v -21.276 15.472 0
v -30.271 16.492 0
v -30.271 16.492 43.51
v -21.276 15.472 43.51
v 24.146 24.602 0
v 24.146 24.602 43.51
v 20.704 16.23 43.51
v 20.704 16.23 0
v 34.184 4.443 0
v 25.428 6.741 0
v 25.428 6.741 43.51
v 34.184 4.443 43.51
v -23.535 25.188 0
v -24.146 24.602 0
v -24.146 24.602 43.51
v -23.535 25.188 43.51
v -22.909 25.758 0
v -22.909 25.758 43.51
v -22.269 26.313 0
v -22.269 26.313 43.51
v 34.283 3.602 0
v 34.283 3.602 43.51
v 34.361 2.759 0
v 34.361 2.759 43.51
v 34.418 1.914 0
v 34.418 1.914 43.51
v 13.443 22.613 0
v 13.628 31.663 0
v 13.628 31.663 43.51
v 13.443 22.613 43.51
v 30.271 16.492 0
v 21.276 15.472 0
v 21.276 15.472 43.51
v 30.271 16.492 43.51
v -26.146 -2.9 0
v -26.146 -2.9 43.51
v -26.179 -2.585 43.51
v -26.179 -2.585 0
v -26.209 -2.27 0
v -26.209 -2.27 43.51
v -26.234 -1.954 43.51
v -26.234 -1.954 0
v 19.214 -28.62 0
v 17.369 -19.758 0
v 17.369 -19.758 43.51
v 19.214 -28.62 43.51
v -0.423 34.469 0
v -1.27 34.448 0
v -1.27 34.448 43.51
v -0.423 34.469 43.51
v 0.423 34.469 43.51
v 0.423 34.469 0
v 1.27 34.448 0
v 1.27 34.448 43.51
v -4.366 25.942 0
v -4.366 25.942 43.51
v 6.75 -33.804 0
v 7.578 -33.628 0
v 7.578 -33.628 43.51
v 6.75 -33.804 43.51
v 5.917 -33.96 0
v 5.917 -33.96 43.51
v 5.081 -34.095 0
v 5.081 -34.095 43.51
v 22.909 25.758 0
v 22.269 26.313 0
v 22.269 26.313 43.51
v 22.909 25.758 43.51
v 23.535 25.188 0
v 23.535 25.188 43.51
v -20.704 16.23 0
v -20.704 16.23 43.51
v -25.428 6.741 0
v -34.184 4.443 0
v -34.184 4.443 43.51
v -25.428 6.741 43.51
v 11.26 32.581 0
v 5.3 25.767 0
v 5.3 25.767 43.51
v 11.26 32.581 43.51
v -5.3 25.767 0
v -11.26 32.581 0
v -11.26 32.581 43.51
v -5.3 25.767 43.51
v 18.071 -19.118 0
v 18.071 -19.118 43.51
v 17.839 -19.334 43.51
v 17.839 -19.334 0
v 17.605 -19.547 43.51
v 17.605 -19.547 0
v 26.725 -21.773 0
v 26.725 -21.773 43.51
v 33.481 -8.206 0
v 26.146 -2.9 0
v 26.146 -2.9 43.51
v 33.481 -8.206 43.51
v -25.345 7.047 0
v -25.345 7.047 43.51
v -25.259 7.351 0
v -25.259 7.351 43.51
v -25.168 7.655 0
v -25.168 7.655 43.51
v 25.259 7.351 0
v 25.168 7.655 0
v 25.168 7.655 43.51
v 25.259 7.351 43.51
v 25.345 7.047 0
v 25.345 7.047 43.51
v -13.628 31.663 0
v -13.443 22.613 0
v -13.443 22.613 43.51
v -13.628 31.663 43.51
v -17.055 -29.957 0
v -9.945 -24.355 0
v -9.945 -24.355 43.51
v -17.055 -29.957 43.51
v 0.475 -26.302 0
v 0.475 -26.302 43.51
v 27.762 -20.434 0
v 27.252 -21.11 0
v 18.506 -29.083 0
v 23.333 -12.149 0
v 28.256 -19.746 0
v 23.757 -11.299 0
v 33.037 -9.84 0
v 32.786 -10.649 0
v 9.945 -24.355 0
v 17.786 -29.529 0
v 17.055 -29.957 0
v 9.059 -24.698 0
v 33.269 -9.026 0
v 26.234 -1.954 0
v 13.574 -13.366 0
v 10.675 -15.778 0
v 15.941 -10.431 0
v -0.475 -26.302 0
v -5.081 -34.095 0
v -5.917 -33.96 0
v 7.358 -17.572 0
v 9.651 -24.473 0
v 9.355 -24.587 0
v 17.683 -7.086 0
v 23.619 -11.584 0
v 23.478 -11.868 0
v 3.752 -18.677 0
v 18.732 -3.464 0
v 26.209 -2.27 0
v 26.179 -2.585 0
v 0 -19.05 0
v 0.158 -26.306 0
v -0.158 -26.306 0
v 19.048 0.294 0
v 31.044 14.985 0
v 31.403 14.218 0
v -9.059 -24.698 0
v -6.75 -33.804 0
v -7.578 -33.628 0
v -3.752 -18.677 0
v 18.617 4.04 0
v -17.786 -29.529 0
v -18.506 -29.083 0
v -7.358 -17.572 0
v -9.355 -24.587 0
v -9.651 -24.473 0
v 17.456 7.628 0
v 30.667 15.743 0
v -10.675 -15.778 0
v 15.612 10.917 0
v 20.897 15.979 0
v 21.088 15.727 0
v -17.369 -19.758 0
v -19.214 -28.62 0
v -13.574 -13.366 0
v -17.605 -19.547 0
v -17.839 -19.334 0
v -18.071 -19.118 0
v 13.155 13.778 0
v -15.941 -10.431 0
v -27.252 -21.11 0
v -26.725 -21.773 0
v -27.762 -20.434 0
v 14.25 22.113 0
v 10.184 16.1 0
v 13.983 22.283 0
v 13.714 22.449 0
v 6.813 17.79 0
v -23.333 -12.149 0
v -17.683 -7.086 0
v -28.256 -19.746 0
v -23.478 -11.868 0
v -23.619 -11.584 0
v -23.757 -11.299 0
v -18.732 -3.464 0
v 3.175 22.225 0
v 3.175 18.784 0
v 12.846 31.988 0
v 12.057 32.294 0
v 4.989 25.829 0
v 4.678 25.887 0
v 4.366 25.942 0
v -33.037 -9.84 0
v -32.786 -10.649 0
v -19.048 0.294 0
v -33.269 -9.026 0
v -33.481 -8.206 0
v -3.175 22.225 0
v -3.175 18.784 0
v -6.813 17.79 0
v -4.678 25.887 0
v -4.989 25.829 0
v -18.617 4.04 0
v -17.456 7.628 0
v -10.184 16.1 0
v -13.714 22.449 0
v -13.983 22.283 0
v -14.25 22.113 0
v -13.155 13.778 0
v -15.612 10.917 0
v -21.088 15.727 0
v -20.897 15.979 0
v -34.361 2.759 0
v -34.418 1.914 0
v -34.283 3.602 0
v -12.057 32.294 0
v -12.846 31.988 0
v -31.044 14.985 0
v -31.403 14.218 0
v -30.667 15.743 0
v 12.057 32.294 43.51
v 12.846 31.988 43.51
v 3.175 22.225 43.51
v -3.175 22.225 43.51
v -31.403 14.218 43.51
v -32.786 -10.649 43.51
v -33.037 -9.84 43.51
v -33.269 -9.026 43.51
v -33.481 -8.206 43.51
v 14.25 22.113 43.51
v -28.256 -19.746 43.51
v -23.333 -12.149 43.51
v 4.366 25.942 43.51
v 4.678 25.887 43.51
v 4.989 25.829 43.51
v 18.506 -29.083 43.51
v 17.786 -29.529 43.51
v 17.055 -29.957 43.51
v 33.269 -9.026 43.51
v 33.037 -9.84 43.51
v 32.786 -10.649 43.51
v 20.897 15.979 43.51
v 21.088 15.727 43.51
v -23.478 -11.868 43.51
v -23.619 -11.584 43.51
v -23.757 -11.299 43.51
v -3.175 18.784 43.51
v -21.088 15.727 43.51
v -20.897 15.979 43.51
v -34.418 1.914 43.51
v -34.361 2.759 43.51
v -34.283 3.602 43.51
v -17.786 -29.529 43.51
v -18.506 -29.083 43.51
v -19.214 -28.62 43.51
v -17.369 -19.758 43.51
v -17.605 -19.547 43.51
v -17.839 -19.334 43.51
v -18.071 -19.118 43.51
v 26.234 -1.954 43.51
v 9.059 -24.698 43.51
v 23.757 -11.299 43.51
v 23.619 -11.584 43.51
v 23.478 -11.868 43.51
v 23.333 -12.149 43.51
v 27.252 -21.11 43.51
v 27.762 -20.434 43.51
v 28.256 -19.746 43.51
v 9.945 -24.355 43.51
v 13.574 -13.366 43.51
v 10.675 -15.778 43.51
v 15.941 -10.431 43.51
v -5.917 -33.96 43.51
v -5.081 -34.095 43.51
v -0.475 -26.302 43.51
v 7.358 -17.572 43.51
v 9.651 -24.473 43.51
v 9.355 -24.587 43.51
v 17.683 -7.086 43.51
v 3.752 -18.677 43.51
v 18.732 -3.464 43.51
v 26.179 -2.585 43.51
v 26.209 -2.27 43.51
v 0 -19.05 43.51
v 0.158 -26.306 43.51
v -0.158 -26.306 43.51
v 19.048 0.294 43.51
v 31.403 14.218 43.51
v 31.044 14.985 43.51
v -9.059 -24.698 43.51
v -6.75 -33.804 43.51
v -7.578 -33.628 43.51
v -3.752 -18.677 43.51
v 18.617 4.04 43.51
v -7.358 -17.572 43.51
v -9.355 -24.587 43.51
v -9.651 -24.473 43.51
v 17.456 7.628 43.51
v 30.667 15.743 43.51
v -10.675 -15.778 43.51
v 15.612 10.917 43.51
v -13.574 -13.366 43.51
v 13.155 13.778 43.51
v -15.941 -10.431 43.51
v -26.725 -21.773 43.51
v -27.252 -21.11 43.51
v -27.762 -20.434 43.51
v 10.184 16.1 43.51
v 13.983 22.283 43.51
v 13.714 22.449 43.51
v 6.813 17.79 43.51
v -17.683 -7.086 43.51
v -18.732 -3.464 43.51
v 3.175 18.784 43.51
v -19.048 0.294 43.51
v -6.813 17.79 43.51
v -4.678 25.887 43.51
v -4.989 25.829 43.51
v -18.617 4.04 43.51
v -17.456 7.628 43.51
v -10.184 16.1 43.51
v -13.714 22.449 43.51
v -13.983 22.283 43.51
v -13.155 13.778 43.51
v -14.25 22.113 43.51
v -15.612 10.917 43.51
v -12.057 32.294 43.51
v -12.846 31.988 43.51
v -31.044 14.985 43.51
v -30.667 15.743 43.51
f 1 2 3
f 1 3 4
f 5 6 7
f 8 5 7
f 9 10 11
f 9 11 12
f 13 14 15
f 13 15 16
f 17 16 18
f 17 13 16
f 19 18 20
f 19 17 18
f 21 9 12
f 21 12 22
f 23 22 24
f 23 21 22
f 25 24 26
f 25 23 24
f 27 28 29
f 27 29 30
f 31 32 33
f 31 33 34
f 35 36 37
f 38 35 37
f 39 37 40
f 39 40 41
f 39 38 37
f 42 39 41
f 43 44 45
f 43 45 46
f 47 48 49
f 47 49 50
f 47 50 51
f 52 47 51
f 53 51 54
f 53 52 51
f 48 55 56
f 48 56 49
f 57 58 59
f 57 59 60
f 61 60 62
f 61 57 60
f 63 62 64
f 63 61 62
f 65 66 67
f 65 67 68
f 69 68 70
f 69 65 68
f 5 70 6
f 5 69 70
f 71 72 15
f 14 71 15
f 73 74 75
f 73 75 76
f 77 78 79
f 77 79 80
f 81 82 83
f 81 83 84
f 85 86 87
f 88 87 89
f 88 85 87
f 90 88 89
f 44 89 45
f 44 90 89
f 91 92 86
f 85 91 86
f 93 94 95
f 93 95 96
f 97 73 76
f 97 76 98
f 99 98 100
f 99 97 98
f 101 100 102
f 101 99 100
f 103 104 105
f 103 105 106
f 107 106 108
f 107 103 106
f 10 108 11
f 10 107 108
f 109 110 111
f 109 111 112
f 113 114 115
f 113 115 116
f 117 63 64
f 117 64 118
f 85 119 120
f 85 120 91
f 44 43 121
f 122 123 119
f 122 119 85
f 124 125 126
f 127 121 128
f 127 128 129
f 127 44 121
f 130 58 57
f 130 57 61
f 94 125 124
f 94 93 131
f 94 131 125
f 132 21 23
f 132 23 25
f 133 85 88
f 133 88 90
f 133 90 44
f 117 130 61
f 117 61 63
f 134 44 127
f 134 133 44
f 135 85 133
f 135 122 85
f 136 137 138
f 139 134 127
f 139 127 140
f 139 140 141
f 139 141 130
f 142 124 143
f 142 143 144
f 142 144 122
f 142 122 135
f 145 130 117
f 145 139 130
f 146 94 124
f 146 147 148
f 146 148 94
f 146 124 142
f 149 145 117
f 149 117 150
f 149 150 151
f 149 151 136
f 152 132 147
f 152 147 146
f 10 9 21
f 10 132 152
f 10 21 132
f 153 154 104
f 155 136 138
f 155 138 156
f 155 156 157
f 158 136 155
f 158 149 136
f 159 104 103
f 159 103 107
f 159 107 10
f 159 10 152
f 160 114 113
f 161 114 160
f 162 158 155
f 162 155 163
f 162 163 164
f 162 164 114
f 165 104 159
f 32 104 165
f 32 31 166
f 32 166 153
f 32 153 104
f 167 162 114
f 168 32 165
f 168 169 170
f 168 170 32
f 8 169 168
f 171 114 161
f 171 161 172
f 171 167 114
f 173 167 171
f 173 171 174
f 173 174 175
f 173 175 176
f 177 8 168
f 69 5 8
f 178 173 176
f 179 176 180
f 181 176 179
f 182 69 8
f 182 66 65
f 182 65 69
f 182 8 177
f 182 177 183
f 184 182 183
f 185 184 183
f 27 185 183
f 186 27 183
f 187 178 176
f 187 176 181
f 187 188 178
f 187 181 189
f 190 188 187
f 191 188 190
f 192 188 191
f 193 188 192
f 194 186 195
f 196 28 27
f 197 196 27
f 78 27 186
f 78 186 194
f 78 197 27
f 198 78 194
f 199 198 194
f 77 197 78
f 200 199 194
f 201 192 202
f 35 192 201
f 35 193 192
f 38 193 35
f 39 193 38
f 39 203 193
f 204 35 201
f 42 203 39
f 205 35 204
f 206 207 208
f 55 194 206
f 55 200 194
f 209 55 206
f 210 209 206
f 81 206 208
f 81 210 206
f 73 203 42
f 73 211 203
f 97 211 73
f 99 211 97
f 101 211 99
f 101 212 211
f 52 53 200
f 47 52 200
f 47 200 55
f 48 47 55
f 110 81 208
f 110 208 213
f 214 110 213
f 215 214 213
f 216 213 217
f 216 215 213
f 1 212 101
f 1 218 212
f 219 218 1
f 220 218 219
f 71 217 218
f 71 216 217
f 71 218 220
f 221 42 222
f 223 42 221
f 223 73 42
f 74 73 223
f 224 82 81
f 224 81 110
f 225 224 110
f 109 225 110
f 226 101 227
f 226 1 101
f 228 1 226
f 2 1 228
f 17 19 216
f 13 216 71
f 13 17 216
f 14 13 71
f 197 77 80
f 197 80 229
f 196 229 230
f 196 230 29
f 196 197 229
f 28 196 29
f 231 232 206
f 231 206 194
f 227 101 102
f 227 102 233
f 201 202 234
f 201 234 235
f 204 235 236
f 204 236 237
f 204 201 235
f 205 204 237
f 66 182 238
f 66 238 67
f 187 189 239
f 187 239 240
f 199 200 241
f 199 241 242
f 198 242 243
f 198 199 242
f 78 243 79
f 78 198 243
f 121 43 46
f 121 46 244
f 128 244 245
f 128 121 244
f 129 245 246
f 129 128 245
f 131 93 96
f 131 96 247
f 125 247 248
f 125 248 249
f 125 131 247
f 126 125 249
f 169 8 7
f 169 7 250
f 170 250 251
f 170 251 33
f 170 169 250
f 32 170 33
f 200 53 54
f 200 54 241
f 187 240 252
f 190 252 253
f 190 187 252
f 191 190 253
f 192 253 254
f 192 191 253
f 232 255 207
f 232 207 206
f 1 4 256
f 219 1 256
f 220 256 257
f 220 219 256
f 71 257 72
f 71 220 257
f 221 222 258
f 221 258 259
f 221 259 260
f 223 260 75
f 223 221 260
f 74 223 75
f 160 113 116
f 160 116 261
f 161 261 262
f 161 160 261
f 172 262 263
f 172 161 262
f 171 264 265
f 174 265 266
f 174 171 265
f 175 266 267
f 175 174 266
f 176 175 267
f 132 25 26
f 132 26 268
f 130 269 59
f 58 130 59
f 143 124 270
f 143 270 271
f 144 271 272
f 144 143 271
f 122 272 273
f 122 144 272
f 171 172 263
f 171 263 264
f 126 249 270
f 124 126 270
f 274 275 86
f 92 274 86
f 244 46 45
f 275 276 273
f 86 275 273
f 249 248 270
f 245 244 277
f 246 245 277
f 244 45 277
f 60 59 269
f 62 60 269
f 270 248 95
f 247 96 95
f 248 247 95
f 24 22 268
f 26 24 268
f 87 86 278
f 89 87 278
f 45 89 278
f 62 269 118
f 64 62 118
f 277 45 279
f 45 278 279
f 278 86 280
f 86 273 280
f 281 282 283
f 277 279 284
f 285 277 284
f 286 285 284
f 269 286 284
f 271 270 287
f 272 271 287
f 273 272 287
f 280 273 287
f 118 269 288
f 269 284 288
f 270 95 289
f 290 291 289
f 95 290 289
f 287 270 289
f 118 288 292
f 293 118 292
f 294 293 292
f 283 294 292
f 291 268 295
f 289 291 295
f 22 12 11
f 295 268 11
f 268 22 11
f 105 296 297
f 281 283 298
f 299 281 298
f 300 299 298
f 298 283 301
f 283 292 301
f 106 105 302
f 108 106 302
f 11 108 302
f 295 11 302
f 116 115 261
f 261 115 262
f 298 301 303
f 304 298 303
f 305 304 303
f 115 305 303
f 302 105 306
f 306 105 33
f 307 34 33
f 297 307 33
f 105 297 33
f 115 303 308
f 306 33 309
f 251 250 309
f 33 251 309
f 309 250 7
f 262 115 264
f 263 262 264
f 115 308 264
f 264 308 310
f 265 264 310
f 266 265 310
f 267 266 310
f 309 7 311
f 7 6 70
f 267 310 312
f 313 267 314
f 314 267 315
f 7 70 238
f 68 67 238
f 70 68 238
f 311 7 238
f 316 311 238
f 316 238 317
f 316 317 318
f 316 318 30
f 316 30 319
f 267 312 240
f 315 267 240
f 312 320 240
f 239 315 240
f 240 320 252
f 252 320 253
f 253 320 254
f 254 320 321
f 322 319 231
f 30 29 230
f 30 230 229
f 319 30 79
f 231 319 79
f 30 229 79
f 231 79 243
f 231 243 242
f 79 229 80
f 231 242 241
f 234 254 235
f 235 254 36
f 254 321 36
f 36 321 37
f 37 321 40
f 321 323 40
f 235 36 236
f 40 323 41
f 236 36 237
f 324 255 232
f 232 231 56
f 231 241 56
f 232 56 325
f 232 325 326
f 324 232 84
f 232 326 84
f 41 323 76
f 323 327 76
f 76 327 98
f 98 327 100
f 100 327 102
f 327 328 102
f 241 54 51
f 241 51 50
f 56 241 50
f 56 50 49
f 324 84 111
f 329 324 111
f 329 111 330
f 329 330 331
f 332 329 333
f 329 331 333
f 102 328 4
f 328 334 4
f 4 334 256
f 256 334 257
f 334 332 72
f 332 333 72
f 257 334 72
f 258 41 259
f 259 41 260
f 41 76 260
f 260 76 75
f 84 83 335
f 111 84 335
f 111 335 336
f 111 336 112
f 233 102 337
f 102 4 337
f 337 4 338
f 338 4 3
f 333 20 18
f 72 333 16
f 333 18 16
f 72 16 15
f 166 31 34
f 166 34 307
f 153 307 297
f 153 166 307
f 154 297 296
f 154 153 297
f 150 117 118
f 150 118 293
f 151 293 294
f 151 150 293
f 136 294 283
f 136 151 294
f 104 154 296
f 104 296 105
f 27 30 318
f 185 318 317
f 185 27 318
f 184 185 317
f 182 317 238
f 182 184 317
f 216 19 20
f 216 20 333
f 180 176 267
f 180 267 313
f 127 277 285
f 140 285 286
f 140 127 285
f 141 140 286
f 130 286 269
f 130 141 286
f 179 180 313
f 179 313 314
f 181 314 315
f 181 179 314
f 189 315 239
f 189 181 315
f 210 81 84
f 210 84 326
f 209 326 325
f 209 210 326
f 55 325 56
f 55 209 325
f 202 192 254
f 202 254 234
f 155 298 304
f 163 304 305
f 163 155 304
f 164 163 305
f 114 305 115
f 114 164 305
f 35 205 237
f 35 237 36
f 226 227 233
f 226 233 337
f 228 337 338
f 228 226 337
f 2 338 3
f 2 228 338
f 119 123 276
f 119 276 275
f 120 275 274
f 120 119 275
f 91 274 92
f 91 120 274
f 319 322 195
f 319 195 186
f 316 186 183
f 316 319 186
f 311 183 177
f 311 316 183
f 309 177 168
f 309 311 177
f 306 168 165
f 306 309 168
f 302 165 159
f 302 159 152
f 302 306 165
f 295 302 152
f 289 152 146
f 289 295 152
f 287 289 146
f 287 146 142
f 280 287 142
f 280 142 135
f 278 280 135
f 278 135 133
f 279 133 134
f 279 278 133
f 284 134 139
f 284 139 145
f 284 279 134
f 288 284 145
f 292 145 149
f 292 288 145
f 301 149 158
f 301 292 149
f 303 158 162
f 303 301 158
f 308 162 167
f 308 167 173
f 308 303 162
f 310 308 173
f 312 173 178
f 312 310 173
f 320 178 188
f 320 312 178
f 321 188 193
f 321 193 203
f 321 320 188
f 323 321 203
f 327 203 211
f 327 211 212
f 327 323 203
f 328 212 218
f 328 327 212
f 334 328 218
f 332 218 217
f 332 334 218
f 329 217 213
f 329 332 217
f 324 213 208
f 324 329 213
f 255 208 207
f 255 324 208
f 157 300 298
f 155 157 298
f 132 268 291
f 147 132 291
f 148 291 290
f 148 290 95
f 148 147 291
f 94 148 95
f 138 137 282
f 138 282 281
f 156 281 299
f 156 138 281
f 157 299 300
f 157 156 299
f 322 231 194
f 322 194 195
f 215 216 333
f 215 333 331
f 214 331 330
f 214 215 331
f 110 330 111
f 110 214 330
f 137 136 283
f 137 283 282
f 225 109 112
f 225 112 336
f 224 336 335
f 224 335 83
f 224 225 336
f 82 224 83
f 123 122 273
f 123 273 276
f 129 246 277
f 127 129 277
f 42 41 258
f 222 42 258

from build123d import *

# Parameters (mm, degrees)
BOSS_EXTRUDE1_DEPTH = 43.5102
CUT_EXTRUDE1_DEPTH  = 43.5102


with BuildPart() as part:
    # Sketch2 → Boss-Extrude1 (new body)
    with BuildSketch(Plane.XY):
        with BuildLine():
            Line((-4.366026501, 25.941944541), (-1.27, 34.448207442))
            ThreePointArc((-1.27, 34.448207442), (0, 34.47161), (1.27, 34.448207442))
            Line((1.27, 34.448207442), (4.366026501, 25.941944541))
            ThreePointArc((4.366026501, 25.941944541), (4.83385814, 25.858857079), (5.300112805, 25.767333549))
            Line((5.300112805, 25.767333549), (11.259888122, 32.580773709))
            ThreePointArc((11.259888122, 32.580773709), (12.452581833, 32.143819028), (13.628367585, 31.663219877))
            Line((13.628367585, 31.663219877), (13.442509735, 22.612952173))
            ThreePointArc((13.442509735, 22.612952173), (13.848735094, 22.366475142), (14.250442508, 22.11270138))
            Line((14.250442508, 22.11270138), (22.26906596, 26.31312595))
            ThreePointArc((22.26906596, 26.31312595), (23.223373486, 25.474827181), (24.14614861, 24.601939015))
            Line((24.14614861, 24.601939015), (20.703507542, 16.229955312))
            ThreePointArc((20.703507542, 16.229955312), (20.993263634, 15.8533768), (21.276170986, 15.471626358))
            Line((21.276170986, 15.471626358), (30.270683044, 16.491744725))
            ThreePointArc((30.270683044, 16.491744725), (30.857719866, 15.365318762), (31.402858467, 14.218029965))
            Line((31.402858467, 14.218029965), (25.168381933, 7.655013053))
            ThreePointArc((25.168381933, 7.655013053), (25.302535593, 7.199192074), (25.428434676, 6.741022466))
            Line((25.428434676, 6.741022466), (34.184076646, 4.443061991))
            ThreePointArc((34.184076646, 4.443061991), (34.324560189, 3.180638903), (34.418438279, 1.913897183))
            Line((34.418438279, 1.913897183), (26.234126882, -1.953781138))
            ThreePointArc((26.234126882, -1.953781138), (26.194559914, -2.427283433), (26.14644736, -2.899993864))
            Line((26.14644736, -2.899993864), (33.480721277, -8.205680884))
            ThreePointArc((33.480721277, -8.205680884), (33.155678459, -9.433603865), (32.785617282, -10.648718018))
            Line((32.785617282, -10.648718018), (23.756807626, -11.298706359))
            ThreePointArc((23.756807626, -11.298706359), (23.54886377, -11.725940863), (23.333237446, -12.149349953))
            Line((23.333237446, -12.149349953), (28.255608976, -19.746201087))
            ThreePointArc((28.255608976, -19.746201087), (27.508938632, -20.773786158), (26.724917, -21.773164845))
            Line((26.724917, -21.773164845), (18.07099986, -19.117678678))
            ThreePointArc((18.07099986, -19.117678678), (17.722763084, -19.440945003), (17.36874452, -19.757869009))
            Line((17.36874452, -19.757869009), (19.214420114, -28.619887416))
            ThreePointArc((19.214420114, -28.619887416), (18.14696421, -29.308353518), (17.054868589, -29.95702511))
            Line((17.054868589, -29.95702511), (9.944603428, -24.354702557))
            ThreePointArc((9.944603428, -24.354702557), (9.503105039, -24.530341795), (9.058506404, -24.697978373))
            Line((9.058506404, -24.697978373), (7.578217344, -33.628299361))
            ThreePointArc((7.578217344, -33.628299361), (6.334141716, -33.884665333), (5.081465671, -34.095023136))
            Line((5.081465671, -34.095023136), (0.475133198, -26.302488901))
            ThreePointArc((0.475133198, -26.302488901), (0, -26.30678), (-0.475133198, -26.302488901))
            Line((-0.475133198, -26.302488901), (-5.081465671, -34.095023136))
            ThreePointArc((-5.081465671, -34.095023136), (-6.334141716, -33.884665333), (-7.578217344, -33.628299361))
            Line((-7.578217344, -33.628299361), (-9.058506404, -24.697978373))
            ThreePointArc((-9.058506404, -24.697978373), (-9.503105039, -24.530341795), (-9.944603428, -24.354702557))
            Line((-9.944603428, -24.354702557), (-17.054868589, -29.95702511))
            ThreePointArc((-17.054868589, -29.95702511), (-18.14696421, -29.308353518), (-19.214420114, -28.619887416))
            Line((-19.214420114, -28.619887416), (-17.36874452, -19.757869009))
            ThreePointArc((-17.36874452, -19.757869009), (-17.722763084, -19.440945003), (-18.07099986, -19.117678678))
            Line((-18.07099986, -19.117678678), (-26.724917, -21.773164845))
            ThreePointArc((-26.724917, -21.773164845), (-27.508938632, -20.773786158), (-28.255608976, -19.746201087))
            Line((-28.255608976, -19.746201087), (-23.333237446, -12.149349953))
            ThreePointArc((-23.333237446, -12.149349953), (-23.54886377, -11.725940863), (-23.756807626, -11.298706359))
            Line((-23.756807626, -11.298706359), (-32.785617282, -10.648718018))
            ThreePointArc((-32.785617282, -10.648718018), (-33.155678459, -9.433603865), (-33.480721277, -8.205680884))
            Line((-33.480721277, -8.205680884), (-26.14644736, -2.899993864))
            ThreePointArc((-26.14644736, -2.899993864), (-26.194559914, -2.427283433), (-26.234126882, -1.953781138))
            Line((-26.234126882, -1.953781138), (-34.418438279, 1.913897183))
            ThreePointArc((-34.418438279, 1.913897183), (-34.324560189, 3.180638903), (-34.184076646, 4.443061991))
            Line((-34.184076646, 4.443061991), (-25.428434676, 6.741022466))
            ThreePointArc((-25.428434676, 6.741022466), (-25.302535593, 7.199192074), (-25.168381933, 7.655013053))
            Line((-25.168381933, 7.655013053), (-31.402858467, 14.218029965))
            ThreePointArc((-31.402858467, 14.218029965), (-30.857719866, 15.365318762), (-30.270683044, 16.491744725))
            Line((-30.270683044, 16.491744725), (-21.276170986, 15.471626358))
            ThreePointArc((-21.276170986, 15.471626358), (-20.993263634, 15.8533768), (-20.703507542, 16.229955312))
            Line((-20.703507542, 16.229955312), (-24.14614861, 24.601939015))
            ThreePointArc((-24.14614861, 24.601939015), (-23.223373486, 25.474827181), (-22.26906596, 26.31312595))
            Line((-22.26906596, 26.31312595), (-14.250442508, 22.11270138))
            ThreePointArc((-14.250442508, 22.11270138), (-13.848735094, 22.366475142), (-13.442509735, 22.612952173))
            Line((-13.442509735, 22.612952173), (-13.628367585, 31.663219877))
            ThreePointArc((-13.628367585, 31.663219877), (-12.452581833, 32.143819028), (-11.259888122, 32.580773709))
            Line((-11.259888122, 32.580773709), (-5.300112805, 25.767333549))
            ThreePointArc((-5.300112805, 25.767333549), (-4.83385814, 25.858857079), (-4.366026501, 25.941944541))
        make_face()
    extrude(amount=BOSS_EXTRUDE1_DEPTH)

    # Sketch4 → Cut-Extrude1 (cut)
    with BuildSketch(Plane.XY.offset(43.5102)):
        with BuildLine():
            Line((-3.175, 22.225), (3.175, 22.225))
            Line((3.175, 22.225), (3.175, 18.783553311))
            ThreePointArc((3.175, 18.783553311), (0, -19.05), (-3.175, 18.783553311))
            Line((-3.175, 18.783553311), (-3.175, 22.225))
        make_face()
    extrude(amount=-CUT_EXTRUDE1_DEPTH, mode=Mode.SUBTRACT)


solid = part.part
